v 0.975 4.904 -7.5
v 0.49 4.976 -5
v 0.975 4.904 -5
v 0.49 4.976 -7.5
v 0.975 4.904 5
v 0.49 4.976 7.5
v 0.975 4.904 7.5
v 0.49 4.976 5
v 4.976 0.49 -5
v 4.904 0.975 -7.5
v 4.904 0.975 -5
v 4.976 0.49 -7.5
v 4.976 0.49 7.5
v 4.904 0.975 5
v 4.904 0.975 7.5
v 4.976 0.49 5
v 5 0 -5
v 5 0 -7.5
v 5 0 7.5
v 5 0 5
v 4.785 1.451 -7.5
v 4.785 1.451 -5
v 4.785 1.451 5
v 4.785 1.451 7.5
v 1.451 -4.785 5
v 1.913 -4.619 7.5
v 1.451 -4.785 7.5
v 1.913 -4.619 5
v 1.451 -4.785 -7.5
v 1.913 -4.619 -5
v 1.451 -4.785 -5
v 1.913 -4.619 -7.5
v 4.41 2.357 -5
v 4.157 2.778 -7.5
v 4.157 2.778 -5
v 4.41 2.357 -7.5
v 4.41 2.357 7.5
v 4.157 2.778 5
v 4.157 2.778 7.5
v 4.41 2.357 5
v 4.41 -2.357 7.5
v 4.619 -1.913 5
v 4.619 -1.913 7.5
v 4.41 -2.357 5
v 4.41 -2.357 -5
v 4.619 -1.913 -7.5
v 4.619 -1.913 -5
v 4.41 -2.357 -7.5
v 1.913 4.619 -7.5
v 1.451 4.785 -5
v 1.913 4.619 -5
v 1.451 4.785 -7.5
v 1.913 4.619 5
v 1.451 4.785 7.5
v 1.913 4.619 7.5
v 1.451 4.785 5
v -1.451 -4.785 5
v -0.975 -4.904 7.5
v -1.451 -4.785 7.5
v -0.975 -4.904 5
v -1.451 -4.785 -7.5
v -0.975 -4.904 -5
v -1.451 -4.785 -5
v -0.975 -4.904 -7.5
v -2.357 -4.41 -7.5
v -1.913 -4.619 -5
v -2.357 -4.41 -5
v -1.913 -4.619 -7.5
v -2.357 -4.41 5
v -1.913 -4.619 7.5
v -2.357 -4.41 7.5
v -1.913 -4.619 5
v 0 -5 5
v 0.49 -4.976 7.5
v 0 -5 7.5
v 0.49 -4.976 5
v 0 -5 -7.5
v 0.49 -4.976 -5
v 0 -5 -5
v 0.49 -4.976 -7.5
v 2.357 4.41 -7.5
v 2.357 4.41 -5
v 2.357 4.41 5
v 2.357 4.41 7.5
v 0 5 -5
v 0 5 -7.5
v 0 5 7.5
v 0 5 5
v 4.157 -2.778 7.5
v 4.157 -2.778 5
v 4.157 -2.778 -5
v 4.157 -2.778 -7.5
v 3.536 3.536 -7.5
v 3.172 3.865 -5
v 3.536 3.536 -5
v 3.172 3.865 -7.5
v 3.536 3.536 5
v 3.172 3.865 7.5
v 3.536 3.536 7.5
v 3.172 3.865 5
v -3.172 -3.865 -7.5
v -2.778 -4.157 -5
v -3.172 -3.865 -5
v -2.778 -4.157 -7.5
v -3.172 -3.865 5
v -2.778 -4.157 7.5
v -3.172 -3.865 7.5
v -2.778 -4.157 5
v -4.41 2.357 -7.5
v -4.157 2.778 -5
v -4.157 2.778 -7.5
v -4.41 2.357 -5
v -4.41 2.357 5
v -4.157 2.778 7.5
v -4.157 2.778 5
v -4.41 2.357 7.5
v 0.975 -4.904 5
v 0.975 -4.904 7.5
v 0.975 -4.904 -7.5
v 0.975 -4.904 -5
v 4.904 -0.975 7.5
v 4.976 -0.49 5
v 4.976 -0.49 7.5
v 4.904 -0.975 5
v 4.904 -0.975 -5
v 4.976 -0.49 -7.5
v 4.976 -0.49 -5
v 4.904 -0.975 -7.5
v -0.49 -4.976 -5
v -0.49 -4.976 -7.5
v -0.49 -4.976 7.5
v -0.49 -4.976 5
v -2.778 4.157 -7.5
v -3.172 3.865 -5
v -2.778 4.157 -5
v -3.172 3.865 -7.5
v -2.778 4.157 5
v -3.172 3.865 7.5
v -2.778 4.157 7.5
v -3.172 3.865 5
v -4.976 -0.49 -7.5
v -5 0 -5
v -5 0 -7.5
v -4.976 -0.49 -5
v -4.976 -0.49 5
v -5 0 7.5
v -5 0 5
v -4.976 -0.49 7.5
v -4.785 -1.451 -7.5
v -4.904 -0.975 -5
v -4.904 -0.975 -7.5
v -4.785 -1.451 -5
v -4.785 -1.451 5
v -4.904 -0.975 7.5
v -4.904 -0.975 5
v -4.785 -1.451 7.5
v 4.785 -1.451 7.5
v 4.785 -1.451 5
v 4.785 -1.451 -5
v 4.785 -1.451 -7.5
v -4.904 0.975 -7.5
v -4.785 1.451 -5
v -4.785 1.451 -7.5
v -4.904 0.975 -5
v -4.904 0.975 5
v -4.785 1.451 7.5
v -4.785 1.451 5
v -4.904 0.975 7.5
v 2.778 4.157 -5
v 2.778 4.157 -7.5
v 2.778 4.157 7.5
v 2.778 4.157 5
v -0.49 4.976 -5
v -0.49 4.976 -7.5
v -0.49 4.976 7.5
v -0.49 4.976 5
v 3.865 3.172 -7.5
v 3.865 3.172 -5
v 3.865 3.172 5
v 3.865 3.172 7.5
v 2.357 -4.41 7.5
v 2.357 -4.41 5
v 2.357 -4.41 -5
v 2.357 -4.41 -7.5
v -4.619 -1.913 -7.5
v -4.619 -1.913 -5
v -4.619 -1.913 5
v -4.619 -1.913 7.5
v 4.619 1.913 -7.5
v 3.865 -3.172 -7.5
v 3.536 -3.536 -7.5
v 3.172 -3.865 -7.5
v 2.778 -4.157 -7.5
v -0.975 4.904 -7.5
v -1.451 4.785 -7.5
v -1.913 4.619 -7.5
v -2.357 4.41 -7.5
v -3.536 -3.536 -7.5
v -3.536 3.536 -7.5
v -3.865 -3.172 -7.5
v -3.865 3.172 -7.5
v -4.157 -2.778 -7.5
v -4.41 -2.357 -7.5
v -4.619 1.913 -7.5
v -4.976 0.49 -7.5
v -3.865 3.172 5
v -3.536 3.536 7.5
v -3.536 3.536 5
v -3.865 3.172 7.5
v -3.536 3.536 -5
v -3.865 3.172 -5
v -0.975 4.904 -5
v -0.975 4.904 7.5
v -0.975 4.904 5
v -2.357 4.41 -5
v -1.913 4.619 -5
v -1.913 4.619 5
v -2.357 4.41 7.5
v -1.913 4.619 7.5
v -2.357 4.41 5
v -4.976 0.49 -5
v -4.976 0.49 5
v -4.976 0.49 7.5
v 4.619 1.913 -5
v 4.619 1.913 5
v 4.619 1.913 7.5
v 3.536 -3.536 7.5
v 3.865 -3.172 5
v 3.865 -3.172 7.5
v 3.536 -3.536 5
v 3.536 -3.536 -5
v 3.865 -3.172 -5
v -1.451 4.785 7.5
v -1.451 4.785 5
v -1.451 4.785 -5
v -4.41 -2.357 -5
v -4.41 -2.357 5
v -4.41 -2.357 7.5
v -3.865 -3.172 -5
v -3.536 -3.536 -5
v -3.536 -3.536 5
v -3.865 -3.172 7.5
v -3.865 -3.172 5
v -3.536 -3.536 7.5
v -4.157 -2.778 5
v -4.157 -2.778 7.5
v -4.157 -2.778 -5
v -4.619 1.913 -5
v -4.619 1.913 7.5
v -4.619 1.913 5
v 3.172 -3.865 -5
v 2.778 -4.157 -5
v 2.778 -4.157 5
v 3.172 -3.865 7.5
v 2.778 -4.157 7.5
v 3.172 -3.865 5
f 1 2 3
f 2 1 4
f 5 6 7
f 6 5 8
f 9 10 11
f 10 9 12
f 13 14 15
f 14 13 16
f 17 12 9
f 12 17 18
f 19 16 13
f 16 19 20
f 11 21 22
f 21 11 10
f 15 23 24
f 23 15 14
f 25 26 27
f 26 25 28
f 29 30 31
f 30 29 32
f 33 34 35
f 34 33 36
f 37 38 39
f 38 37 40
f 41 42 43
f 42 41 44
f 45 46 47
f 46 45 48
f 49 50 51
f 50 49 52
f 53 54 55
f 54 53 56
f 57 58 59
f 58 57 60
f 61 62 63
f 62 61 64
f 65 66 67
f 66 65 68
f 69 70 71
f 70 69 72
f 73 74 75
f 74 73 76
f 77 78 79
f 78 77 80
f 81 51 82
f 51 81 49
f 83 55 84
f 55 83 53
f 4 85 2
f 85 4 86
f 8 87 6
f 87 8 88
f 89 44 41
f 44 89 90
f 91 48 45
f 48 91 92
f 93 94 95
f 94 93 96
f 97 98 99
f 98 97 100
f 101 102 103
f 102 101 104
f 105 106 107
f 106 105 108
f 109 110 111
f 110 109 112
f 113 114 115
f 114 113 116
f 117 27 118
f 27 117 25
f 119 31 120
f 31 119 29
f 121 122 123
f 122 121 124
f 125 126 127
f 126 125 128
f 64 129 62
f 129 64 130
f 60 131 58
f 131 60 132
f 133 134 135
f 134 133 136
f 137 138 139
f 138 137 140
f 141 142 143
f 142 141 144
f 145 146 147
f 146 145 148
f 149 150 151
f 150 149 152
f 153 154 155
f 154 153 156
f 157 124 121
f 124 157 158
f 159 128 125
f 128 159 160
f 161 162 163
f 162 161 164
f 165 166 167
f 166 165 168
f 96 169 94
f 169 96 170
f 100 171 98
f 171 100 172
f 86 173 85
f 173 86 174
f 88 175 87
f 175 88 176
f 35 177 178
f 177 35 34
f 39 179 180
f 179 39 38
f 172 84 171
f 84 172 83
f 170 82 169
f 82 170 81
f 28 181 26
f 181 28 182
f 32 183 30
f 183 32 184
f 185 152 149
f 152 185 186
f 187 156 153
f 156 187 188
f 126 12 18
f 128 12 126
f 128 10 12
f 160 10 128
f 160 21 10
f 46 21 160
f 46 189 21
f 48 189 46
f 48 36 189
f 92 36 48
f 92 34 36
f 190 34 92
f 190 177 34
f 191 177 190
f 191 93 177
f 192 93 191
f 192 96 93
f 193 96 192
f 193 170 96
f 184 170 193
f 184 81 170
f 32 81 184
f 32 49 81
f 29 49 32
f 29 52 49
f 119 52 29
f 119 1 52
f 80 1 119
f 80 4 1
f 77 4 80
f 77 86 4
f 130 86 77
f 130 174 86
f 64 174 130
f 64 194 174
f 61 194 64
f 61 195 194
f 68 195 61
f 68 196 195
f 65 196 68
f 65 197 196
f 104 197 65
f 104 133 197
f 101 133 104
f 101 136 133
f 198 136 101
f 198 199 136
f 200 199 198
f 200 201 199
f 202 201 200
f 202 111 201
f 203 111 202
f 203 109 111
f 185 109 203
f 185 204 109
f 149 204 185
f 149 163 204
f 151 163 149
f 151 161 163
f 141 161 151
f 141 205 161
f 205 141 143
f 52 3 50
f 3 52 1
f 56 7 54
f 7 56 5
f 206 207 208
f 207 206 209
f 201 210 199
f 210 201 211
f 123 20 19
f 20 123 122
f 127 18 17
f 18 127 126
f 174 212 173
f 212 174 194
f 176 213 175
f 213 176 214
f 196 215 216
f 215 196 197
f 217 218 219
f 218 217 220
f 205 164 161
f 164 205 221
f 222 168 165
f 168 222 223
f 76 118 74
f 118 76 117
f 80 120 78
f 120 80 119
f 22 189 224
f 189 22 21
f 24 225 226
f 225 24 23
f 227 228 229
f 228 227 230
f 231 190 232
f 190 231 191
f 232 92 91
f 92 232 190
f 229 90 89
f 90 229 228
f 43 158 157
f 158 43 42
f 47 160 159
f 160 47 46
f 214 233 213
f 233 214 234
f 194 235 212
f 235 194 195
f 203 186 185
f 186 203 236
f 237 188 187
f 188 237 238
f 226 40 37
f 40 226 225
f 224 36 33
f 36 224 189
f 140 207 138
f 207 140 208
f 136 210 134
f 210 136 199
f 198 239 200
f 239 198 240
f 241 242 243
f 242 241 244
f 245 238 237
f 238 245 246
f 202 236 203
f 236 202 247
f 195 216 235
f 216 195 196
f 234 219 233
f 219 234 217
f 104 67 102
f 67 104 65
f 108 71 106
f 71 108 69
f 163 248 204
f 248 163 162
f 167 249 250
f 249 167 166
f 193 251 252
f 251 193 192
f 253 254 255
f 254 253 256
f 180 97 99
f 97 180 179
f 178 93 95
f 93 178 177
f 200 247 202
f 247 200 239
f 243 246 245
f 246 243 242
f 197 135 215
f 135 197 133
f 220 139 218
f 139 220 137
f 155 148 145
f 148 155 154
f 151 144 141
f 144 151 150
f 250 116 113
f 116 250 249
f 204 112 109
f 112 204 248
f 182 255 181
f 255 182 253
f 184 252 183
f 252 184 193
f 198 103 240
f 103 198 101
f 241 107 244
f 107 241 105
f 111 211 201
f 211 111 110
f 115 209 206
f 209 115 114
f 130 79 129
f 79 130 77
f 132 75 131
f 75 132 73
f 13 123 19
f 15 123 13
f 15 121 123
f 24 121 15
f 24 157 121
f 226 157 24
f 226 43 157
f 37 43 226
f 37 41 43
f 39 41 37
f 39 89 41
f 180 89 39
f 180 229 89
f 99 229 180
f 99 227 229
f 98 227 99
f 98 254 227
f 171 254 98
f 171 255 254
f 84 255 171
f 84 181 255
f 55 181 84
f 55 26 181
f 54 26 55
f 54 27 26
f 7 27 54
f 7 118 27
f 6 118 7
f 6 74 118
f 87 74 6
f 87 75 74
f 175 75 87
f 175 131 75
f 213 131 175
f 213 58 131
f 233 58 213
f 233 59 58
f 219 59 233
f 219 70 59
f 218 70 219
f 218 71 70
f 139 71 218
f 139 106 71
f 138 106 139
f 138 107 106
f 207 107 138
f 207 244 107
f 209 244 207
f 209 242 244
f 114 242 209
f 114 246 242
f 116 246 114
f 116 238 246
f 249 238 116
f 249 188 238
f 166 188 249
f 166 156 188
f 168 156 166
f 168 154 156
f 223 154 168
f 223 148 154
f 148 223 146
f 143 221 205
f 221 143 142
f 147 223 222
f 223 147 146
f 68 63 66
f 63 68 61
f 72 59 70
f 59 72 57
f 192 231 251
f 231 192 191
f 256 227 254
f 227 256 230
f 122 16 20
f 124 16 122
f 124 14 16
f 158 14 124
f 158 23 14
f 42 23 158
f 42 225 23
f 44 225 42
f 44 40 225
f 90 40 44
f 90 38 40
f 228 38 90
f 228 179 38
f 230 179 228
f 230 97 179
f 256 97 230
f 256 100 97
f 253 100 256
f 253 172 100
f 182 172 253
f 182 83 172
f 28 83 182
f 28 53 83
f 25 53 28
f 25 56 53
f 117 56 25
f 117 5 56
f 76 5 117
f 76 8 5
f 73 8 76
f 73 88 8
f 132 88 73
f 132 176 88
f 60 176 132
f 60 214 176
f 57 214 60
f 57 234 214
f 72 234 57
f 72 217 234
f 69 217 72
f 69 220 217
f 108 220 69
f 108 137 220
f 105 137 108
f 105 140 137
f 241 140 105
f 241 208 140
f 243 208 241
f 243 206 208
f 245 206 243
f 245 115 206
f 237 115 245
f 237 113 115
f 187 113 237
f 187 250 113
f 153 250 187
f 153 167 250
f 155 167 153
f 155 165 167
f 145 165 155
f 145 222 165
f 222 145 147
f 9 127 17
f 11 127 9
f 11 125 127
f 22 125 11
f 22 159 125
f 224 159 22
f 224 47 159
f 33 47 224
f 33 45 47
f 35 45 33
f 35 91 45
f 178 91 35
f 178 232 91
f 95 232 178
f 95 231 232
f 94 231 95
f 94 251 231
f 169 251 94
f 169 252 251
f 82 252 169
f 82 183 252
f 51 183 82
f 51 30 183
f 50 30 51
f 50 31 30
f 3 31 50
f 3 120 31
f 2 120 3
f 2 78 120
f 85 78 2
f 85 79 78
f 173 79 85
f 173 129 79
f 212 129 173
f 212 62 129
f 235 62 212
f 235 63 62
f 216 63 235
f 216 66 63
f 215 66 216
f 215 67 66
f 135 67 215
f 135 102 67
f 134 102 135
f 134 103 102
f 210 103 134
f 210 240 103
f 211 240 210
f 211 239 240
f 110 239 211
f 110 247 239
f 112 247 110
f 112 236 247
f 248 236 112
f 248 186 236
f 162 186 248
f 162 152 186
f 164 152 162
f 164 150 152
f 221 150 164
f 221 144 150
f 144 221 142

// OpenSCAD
// Set fragment number for roundings
$fn = $preview ? 32 : 64;

// Size of the cube (all directions)
cubSiz = 10;

//Diameter of the Cylinder
cyDia = 10;

//Height of the Cylinder
cyHei = 15;

// Or subtract Cube from Cylinder
// The order does matter with difference()
difference(){
    cylinder(d = cyDia, h = cyHei, center = true);
    cube(size = [cubSiz, cubSiz, cubSiz], center = true);
}
